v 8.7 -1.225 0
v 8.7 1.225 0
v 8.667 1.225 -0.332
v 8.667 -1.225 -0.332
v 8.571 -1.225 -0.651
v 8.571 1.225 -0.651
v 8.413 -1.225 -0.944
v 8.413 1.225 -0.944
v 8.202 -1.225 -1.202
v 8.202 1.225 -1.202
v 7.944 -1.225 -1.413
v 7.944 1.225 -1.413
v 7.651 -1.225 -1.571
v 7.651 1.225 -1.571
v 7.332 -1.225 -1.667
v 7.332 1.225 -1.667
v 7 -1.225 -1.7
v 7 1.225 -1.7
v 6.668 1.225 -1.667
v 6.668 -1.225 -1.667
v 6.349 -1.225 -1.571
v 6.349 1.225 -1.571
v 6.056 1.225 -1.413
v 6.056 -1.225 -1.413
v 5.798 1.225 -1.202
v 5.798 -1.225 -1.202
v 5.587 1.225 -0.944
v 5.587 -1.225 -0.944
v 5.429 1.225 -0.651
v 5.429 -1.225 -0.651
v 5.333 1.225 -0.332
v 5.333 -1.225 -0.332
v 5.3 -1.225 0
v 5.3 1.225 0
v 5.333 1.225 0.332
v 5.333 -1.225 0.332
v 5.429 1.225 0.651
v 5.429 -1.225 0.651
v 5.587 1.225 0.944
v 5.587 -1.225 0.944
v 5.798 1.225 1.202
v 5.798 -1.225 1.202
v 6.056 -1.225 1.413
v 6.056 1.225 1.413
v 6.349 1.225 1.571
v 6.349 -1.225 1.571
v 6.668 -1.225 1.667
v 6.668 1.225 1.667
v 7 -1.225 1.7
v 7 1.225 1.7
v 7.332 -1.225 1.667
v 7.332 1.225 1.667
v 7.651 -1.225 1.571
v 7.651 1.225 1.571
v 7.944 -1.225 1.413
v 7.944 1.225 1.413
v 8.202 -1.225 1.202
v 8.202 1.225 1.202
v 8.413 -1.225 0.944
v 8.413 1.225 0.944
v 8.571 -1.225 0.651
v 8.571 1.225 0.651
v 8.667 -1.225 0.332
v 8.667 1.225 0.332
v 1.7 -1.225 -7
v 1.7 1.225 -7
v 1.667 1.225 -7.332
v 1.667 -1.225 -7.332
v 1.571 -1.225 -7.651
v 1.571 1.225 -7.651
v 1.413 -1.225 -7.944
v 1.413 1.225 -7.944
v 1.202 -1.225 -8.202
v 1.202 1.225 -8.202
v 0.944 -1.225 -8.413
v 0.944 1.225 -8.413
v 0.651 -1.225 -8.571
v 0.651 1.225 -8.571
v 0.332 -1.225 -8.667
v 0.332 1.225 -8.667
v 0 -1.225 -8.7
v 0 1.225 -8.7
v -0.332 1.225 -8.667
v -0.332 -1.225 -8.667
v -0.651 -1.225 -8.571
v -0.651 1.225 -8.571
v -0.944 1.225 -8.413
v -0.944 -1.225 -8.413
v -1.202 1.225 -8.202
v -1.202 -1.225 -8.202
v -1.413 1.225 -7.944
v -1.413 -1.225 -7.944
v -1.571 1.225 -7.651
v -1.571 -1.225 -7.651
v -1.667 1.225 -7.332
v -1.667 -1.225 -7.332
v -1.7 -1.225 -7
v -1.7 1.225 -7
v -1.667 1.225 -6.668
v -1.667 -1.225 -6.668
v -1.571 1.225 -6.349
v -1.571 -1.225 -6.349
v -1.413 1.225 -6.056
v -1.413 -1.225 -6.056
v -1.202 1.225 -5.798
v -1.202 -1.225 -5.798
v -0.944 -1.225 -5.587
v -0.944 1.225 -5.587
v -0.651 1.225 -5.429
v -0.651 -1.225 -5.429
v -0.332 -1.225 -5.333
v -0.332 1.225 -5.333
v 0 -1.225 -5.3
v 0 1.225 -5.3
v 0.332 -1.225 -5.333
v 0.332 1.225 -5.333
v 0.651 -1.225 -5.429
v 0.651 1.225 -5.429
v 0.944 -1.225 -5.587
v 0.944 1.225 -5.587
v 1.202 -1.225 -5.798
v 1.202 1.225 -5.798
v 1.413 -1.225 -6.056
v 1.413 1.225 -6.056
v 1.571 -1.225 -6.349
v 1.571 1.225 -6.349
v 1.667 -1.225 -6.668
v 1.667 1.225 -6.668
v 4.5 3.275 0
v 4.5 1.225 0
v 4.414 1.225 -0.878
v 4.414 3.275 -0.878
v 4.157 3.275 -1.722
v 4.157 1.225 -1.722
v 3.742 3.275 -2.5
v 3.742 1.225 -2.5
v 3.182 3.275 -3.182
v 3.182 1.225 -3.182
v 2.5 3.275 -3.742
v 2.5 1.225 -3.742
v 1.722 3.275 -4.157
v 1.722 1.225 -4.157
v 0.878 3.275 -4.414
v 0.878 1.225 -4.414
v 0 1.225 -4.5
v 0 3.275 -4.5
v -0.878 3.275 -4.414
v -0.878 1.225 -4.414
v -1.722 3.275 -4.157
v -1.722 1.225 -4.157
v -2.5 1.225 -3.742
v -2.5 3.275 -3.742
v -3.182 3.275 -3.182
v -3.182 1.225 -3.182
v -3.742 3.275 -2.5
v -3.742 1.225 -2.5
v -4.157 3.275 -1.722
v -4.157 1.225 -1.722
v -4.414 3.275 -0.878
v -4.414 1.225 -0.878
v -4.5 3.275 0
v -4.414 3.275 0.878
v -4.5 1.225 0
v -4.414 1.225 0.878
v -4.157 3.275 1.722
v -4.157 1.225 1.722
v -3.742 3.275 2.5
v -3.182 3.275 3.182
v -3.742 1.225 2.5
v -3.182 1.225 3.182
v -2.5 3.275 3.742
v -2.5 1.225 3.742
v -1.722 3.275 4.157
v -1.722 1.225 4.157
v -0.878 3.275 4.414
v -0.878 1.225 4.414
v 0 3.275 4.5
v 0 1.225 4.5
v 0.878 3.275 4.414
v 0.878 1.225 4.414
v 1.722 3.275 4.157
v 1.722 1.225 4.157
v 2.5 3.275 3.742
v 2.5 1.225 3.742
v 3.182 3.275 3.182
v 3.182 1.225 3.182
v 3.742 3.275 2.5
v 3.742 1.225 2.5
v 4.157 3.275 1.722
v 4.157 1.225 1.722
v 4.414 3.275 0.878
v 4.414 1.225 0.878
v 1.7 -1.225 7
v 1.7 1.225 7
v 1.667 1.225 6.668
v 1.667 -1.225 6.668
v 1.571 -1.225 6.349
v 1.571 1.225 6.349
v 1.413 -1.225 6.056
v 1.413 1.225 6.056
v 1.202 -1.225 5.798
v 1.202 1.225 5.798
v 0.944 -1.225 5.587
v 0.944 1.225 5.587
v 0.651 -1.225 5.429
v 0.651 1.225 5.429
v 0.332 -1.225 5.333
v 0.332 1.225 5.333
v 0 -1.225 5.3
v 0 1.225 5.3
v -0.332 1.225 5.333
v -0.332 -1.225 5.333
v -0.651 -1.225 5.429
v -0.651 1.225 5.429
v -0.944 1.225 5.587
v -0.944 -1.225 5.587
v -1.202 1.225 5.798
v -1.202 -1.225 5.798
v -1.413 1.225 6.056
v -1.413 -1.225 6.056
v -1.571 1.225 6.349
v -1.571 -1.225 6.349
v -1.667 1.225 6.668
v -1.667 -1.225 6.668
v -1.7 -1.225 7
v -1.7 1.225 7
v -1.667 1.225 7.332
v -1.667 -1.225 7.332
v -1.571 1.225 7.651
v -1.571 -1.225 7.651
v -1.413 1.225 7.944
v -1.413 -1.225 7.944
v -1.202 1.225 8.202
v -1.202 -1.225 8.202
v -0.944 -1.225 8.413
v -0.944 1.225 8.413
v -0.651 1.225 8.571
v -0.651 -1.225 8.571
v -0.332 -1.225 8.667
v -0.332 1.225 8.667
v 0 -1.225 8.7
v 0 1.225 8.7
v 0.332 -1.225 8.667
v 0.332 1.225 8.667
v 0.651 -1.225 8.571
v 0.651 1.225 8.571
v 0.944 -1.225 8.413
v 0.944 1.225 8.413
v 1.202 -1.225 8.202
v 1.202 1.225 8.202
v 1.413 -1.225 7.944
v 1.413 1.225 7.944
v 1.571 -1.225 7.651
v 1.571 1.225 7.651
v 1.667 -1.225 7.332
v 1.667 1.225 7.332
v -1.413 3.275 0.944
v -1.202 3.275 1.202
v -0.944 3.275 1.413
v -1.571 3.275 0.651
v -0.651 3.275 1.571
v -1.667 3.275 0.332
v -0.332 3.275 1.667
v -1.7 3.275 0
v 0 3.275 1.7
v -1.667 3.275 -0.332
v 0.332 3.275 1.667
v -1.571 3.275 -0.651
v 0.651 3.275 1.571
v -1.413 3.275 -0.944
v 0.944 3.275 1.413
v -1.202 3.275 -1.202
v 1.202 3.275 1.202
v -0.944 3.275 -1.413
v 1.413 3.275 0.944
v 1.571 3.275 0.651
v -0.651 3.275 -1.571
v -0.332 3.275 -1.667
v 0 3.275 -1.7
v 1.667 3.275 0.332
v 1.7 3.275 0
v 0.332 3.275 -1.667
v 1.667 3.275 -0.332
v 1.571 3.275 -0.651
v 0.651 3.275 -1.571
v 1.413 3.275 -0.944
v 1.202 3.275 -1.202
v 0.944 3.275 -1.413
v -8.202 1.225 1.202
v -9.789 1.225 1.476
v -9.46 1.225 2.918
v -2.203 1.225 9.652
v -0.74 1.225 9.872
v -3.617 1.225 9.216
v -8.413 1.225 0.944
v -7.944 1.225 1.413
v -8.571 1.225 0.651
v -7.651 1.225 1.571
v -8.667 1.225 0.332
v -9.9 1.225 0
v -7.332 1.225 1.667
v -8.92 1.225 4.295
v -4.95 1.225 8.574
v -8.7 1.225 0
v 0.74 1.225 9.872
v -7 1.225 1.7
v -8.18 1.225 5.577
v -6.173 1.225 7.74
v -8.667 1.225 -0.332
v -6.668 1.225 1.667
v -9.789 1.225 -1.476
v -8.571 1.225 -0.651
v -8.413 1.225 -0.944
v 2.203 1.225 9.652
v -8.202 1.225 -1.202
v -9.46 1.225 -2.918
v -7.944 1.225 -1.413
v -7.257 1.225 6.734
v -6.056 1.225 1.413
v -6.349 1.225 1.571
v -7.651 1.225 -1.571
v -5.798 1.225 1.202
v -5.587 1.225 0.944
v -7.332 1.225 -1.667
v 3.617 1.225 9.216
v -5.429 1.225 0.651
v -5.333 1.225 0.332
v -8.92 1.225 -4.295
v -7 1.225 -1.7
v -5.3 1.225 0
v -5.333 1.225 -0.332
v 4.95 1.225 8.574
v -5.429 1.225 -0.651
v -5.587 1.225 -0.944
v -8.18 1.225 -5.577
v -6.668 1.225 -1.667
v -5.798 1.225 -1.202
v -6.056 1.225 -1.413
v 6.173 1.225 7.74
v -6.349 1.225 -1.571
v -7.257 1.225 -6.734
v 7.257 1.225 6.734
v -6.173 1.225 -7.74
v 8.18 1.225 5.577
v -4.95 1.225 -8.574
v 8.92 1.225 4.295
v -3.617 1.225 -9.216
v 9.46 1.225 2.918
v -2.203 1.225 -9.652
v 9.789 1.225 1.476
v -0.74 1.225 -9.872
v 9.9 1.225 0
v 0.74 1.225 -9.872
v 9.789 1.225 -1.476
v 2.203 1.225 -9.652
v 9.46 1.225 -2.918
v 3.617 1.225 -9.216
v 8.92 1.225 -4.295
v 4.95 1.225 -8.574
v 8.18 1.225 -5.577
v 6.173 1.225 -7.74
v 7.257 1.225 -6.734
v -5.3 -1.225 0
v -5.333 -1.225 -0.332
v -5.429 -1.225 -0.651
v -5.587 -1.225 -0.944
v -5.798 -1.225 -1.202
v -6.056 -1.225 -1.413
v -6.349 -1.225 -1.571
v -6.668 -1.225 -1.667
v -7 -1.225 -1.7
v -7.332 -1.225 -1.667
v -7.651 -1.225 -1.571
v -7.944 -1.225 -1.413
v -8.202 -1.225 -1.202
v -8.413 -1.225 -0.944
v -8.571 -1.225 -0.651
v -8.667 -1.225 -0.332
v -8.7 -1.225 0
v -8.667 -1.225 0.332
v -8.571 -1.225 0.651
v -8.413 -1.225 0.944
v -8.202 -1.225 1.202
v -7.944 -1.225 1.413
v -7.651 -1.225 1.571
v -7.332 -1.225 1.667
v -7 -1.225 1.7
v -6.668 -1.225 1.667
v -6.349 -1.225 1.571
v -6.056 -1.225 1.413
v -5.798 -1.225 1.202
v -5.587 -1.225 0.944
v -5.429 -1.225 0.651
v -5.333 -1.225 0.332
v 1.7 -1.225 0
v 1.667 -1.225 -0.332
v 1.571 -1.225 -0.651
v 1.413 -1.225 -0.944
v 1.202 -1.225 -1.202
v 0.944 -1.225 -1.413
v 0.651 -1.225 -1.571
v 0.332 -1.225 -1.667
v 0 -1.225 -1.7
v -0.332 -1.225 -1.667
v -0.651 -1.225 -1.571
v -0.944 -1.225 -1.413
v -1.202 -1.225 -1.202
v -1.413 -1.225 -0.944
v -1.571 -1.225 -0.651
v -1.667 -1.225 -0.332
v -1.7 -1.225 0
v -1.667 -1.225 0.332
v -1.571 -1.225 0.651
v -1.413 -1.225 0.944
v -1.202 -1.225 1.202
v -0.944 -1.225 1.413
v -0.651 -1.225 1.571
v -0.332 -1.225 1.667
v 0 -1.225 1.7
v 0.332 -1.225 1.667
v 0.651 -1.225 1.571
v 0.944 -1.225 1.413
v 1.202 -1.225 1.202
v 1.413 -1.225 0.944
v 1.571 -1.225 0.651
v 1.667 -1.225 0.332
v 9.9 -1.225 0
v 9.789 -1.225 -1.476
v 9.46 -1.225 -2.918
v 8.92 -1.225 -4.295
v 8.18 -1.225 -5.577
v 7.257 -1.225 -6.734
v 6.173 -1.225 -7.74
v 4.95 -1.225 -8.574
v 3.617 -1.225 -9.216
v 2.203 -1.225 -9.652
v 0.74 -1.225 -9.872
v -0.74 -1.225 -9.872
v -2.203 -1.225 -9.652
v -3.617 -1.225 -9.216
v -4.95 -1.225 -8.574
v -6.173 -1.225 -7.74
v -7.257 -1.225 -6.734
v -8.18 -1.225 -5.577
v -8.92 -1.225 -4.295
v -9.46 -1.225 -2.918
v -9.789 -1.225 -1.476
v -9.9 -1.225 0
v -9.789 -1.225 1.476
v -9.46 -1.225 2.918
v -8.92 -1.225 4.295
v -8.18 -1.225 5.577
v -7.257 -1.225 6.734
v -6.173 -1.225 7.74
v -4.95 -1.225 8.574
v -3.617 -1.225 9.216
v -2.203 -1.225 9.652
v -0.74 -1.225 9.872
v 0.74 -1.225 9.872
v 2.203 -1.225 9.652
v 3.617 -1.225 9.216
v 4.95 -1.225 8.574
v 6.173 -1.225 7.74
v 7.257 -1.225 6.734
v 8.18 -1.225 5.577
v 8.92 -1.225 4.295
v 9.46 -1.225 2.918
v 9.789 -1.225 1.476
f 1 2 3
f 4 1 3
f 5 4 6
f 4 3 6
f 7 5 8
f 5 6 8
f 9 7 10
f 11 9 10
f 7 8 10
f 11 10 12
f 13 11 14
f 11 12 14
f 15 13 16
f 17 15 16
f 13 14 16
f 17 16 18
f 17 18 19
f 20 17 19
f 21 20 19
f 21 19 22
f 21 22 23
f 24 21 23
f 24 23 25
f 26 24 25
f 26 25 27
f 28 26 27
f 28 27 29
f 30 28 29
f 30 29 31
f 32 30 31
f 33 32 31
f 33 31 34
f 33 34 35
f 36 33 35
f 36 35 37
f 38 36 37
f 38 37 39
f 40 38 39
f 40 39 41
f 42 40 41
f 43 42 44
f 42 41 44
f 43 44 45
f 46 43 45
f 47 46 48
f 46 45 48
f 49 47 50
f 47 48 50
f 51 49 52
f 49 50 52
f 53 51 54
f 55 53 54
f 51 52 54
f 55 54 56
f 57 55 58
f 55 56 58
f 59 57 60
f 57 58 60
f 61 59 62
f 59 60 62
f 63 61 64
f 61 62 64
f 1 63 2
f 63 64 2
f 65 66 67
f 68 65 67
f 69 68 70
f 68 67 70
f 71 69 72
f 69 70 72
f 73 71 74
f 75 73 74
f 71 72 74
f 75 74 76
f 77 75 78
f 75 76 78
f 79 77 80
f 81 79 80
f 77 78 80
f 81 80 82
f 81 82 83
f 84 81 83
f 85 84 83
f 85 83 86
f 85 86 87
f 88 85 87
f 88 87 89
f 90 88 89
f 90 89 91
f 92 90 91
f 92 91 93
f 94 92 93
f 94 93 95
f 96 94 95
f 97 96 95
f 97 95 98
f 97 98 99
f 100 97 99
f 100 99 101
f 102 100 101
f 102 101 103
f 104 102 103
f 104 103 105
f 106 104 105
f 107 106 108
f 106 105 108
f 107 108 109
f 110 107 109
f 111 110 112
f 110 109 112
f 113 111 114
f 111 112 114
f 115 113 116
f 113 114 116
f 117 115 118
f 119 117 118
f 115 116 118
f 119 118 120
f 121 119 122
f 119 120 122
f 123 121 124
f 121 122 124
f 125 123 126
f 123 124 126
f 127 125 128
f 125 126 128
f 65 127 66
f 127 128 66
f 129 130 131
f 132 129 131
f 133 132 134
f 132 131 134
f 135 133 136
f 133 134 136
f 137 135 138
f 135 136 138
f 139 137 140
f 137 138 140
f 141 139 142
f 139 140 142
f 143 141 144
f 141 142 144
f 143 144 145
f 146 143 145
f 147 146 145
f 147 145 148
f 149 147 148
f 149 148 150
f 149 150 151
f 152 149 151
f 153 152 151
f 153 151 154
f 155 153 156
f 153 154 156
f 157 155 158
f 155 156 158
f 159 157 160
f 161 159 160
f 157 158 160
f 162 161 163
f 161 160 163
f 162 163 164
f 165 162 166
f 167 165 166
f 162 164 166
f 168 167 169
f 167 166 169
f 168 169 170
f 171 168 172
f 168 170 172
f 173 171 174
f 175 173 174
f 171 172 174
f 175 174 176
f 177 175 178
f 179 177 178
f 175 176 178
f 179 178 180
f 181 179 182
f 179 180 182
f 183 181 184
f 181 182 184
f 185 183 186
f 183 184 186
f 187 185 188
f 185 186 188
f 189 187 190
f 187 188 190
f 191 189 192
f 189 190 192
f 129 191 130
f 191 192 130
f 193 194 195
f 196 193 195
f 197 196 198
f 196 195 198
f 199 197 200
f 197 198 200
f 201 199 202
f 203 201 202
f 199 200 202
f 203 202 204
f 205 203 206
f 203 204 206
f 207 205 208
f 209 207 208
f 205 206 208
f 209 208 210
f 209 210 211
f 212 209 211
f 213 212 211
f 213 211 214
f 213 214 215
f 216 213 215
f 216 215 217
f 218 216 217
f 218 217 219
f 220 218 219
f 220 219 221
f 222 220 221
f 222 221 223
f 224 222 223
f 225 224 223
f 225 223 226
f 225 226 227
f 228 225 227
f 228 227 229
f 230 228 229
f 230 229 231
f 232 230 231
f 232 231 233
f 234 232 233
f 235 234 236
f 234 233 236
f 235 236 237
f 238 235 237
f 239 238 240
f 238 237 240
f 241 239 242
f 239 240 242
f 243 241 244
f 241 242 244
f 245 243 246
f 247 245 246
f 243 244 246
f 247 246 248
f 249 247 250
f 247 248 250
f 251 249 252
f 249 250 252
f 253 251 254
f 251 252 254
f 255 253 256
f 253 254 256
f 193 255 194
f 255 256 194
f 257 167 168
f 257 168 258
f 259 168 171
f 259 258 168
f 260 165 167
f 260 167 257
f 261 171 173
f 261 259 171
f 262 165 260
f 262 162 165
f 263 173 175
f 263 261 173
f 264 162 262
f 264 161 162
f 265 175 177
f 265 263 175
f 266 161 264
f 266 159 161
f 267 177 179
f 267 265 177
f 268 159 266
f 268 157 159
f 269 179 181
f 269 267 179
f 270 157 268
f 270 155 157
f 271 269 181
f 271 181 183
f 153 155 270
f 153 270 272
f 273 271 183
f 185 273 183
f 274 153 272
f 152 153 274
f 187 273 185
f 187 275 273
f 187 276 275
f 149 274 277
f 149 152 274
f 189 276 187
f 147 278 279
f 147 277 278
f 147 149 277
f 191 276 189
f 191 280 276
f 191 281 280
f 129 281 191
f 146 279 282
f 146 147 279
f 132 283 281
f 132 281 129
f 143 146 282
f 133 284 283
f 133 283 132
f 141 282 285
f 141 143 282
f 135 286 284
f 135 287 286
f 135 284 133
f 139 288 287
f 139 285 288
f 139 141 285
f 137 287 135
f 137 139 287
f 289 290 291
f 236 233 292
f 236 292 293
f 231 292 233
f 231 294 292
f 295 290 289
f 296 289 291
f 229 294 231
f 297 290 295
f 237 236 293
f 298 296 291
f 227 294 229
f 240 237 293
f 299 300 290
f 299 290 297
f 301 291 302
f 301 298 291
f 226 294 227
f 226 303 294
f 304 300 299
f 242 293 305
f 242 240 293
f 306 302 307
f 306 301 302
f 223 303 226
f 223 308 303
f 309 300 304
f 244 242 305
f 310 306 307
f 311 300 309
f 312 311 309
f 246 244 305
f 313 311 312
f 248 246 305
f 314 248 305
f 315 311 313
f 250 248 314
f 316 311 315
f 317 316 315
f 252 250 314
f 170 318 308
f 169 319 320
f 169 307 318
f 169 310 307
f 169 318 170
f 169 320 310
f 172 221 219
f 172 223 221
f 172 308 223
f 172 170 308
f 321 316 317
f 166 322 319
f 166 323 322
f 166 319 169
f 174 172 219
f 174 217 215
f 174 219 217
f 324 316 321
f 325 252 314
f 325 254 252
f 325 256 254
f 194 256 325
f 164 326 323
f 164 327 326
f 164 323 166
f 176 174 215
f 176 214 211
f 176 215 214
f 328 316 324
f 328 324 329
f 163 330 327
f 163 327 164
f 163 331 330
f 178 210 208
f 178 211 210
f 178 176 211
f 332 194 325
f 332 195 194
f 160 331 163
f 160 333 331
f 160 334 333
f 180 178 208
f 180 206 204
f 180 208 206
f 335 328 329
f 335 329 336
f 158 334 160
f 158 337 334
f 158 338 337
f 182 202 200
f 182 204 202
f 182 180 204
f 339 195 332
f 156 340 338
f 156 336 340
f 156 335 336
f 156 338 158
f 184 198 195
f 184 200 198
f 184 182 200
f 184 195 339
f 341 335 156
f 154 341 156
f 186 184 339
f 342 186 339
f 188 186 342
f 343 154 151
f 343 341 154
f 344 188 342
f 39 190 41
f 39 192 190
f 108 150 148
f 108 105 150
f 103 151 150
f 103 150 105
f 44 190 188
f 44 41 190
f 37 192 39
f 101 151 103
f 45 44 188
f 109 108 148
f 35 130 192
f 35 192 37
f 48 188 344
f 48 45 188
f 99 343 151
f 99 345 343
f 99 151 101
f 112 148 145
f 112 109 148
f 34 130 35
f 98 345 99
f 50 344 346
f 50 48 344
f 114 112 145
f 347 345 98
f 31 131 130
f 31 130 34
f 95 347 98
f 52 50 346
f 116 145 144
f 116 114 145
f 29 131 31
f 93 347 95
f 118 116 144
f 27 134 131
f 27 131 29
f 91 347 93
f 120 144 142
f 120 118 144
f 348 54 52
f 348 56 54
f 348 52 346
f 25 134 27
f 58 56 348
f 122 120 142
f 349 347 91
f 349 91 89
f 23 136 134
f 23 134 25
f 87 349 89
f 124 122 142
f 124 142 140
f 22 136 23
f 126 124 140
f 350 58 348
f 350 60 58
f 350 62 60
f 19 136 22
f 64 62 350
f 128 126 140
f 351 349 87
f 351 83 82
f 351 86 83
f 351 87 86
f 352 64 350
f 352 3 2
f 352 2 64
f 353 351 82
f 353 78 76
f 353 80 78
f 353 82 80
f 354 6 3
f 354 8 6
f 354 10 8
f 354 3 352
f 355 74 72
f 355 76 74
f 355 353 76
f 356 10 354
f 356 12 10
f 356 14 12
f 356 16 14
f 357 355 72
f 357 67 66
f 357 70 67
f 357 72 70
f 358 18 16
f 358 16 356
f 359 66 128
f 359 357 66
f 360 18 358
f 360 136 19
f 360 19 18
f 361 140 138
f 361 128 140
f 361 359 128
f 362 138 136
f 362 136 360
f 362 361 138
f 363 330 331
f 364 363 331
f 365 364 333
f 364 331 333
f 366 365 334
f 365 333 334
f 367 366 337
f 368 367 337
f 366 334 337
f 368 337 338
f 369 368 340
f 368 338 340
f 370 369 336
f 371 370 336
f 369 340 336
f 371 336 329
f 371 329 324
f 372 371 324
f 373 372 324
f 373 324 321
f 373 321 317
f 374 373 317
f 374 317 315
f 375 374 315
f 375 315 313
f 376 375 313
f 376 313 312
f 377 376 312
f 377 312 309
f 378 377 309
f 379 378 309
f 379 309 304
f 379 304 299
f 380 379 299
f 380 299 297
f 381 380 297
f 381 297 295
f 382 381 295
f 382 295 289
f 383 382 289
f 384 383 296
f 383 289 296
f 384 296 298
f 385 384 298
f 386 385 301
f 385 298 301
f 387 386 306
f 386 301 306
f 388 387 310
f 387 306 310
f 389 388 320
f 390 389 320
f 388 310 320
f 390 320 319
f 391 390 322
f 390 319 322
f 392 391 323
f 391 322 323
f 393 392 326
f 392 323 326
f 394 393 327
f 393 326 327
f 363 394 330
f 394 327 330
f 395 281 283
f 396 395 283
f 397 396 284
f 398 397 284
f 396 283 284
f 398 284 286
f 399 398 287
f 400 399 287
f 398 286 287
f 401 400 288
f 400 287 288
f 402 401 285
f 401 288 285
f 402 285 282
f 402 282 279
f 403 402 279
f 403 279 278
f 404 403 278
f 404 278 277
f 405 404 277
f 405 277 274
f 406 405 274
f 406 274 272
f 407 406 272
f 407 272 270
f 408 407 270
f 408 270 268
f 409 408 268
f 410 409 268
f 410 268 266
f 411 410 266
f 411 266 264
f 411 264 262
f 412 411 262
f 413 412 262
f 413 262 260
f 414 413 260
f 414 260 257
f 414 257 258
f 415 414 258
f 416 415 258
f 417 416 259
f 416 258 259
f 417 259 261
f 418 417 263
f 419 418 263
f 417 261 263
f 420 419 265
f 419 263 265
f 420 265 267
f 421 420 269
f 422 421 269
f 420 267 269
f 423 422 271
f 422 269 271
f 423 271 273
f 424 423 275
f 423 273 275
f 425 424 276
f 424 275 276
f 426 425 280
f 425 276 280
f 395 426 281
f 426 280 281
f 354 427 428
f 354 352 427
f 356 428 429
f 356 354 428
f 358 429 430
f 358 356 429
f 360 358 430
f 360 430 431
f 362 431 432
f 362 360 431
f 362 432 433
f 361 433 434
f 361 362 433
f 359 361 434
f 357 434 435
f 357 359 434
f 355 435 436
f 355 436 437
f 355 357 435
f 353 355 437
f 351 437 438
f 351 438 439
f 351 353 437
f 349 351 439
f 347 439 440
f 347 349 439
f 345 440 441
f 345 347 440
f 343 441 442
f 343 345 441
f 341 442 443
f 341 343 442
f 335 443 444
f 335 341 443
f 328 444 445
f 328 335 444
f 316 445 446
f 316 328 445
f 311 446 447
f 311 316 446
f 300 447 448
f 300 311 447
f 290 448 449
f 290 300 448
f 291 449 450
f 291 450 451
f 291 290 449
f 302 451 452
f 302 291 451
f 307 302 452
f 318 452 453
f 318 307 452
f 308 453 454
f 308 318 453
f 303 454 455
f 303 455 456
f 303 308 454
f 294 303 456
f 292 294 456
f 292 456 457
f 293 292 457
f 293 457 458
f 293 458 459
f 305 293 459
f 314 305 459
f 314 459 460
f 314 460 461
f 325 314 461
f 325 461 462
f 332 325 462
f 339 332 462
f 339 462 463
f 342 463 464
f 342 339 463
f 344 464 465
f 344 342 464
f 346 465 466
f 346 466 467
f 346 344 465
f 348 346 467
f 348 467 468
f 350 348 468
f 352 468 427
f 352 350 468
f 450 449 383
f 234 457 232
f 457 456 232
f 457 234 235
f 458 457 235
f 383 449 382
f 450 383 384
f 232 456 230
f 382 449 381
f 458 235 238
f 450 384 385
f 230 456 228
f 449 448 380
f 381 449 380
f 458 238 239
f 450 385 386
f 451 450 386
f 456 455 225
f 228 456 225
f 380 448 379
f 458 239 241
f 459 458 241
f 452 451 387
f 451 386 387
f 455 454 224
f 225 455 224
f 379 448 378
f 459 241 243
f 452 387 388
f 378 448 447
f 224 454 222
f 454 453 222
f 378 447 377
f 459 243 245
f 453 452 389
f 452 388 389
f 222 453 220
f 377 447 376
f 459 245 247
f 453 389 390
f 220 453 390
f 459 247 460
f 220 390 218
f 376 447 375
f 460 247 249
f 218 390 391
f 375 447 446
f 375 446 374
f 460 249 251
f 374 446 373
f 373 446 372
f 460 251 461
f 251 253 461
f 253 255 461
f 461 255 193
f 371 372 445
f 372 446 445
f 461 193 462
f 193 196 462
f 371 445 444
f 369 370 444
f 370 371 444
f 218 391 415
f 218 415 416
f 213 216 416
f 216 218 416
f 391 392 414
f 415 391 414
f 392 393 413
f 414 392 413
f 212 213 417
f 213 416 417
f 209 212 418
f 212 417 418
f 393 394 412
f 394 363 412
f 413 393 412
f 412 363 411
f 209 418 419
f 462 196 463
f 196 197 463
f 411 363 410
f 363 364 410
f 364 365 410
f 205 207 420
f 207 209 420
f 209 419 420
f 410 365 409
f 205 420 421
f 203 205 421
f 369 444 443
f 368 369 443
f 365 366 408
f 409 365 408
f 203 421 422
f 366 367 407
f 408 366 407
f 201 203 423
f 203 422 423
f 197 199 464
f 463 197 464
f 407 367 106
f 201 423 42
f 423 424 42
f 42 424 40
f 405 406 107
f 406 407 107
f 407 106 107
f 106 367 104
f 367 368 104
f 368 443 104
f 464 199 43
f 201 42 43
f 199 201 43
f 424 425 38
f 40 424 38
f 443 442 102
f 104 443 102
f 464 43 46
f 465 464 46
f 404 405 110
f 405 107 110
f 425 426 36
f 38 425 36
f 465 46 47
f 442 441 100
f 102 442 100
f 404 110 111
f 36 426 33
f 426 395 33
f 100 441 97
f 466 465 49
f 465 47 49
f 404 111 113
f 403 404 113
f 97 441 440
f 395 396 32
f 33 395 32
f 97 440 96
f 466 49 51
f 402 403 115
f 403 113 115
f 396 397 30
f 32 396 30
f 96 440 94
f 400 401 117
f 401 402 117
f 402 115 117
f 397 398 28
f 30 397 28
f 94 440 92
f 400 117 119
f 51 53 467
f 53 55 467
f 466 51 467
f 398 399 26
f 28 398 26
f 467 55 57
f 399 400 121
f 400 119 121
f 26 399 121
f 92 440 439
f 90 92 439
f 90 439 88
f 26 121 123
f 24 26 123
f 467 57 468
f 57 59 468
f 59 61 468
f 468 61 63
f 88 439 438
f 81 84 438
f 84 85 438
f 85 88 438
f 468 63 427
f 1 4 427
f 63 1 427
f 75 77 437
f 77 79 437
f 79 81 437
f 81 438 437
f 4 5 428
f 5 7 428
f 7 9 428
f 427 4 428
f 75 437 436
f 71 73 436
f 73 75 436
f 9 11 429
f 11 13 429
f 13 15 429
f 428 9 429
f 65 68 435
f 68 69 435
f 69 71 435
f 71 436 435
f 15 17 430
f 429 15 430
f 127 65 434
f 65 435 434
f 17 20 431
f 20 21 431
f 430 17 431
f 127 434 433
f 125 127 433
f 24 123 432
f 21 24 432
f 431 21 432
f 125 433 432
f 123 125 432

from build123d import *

# Parameters (mm, degrees)
SKETCH2_R            = 9.9
BOSS_EXTRUDE1_DEPTH  = 1.225
SKETCH3_R            = 4.5
BOSS_EXTRUDE2_DEPTH  = 2.05
M3_CLEARANCE_HOLE1_D = 3.4


with BuildPart() as part:
    # Sketch2 → Boss-Extrude1 (new body, symmetric)
    with BuildSketch(Plane(origin=(0, 0, 0), x_dir=(1, 0, 0), z_dir=(0, 1, 0))):
        Circle(SKETCH2_R)
    extrude(amount=BOSS_EXTRUDE1_DEPTH, both=True)

    # Sketch3 → Boss-Extrude2 (add)
    with BuildSketch(Plane(origin=(0, 1.225, 0), x_dir=(1, 0, 0), z_dir=(0, 1, 0))):
        Circle(SKETCH3_R)
    extrude(amount=BOSS_EXTRUDE2_DEPTH)

    # M3 Clearance Hole1 (through all)
    with Locations(Plane(origin=(0, -1.225, 0), x_dir=(-1, 0, 0), z_dir=(0, -1, 0))):
        with Locations((0, 0), (0, 7), (7, 0), (0, -7), (-7, 0)):
            Hole(M3_CLEARANCE_HOLE1_D / 2)


solid = part.part
